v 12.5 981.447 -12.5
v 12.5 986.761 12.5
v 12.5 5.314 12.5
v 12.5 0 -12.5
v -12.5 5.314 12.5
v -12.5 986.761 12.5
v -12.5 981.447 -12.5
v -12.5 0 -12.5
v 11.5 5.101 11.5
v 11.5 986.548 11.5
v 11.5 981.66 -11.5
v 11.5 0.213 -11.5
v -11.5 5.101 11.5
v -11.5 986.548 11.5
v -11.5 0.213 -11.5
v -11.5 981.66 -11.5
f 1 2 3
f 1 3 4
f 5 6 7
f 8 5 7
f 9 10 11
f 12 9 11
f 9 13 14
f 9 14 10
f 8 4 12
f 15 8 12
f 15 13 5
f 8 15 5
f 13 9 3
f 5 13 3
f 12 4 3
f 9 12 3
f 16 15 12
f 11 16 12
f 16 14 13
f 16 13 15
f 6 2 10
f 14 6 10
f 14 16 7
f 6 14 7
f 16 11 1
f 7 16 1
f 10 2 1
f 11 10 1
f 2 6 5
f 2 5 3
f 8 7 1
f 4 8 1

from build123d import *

# Parameters (mm, degrees)
SKETCH1_W           = 25
SKETCH1_H           = 25
SKETCH1_W_2         = 23
SKETCH1_H_2         = 23
BOSS_EXTRUDE1_DEPTH = 1200
CUT_EXTRUDE1_DEPTH  = 1201.325476694


with BuildPart() as part:
    # Sketch1 → Boss-Extrude1 (new body)
    with BuildSketch(Plane(origin=(0, 0, 0), x_dir=(1, 0, 0), z_dir=(0, 1, 0))):
        Rectangle(SKETCH1_W, SKETCH1_H)
        Rectangle(SKETCH1_W_2, SKETCH1_H_2, mode=Mode.SUBTRACT)
    extrude(amount=BOSS_EXTRUDE1_DEPTH)

    # Sketch2 → Cut-Extrude1 (cut, through all)
    with BuildSketch(Plane(origin=(12.5, 0, 0), x_dir=(0, 0, -1), z_dir=(1, 0, 0))):
        Polygon((12.5, 0), (-12.5, 5.313914042), (-12.5, 0), align=None)
        Polygon((12.5, 1200), (-12.5, 1200), (-12.5, 986.760885112), (12.5, 981.44697107), align=None)
    extrude(amount=-CUT_EXTRUDE1_DEPTH, mode=Mode.SUBTRACT)


solid = part.part
